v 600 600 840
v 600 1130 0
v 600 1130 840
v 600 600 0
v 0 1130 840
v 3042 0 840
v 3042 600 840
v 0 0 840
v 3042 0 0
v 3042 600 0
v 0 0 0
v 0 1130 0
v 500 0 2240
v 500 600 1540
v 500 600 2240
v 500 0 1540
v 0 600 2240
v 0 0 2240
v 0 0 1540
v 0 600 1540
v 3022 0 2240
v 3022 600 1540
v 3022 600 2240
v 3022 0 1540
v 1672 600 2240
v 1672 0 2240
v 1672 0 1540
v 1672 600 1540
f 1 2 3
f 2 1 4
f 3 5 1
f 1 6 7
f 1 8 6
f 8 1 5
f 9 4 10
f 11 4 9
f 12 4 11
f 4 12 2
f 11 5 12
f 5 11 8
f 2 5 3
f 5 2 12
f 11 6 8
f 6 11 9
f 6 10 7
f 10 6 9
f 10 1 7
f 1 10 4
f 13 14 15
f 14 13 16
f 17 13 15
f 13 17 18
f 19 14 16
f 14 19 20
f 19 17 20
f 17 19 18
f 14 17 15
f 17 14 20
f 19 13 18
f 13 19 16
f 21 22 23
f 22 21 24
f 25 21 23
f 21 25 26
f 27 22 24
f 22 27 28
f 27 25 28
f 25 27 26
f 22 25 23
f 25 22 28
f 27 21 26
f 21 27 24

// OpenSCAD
//橱柜
module cupboard(){
union(){
cube([600,1130,840]);
translate([600,0,0])
cube([2442,,600,840]);
//靠墙吊柜
translate([0,0,840+700])
color("red")
cube([500,600,700]);
translate([3042-450-900-20,0,840+700])
color("red")
cube([450+900,600,700]);
}

}
cupboard();
